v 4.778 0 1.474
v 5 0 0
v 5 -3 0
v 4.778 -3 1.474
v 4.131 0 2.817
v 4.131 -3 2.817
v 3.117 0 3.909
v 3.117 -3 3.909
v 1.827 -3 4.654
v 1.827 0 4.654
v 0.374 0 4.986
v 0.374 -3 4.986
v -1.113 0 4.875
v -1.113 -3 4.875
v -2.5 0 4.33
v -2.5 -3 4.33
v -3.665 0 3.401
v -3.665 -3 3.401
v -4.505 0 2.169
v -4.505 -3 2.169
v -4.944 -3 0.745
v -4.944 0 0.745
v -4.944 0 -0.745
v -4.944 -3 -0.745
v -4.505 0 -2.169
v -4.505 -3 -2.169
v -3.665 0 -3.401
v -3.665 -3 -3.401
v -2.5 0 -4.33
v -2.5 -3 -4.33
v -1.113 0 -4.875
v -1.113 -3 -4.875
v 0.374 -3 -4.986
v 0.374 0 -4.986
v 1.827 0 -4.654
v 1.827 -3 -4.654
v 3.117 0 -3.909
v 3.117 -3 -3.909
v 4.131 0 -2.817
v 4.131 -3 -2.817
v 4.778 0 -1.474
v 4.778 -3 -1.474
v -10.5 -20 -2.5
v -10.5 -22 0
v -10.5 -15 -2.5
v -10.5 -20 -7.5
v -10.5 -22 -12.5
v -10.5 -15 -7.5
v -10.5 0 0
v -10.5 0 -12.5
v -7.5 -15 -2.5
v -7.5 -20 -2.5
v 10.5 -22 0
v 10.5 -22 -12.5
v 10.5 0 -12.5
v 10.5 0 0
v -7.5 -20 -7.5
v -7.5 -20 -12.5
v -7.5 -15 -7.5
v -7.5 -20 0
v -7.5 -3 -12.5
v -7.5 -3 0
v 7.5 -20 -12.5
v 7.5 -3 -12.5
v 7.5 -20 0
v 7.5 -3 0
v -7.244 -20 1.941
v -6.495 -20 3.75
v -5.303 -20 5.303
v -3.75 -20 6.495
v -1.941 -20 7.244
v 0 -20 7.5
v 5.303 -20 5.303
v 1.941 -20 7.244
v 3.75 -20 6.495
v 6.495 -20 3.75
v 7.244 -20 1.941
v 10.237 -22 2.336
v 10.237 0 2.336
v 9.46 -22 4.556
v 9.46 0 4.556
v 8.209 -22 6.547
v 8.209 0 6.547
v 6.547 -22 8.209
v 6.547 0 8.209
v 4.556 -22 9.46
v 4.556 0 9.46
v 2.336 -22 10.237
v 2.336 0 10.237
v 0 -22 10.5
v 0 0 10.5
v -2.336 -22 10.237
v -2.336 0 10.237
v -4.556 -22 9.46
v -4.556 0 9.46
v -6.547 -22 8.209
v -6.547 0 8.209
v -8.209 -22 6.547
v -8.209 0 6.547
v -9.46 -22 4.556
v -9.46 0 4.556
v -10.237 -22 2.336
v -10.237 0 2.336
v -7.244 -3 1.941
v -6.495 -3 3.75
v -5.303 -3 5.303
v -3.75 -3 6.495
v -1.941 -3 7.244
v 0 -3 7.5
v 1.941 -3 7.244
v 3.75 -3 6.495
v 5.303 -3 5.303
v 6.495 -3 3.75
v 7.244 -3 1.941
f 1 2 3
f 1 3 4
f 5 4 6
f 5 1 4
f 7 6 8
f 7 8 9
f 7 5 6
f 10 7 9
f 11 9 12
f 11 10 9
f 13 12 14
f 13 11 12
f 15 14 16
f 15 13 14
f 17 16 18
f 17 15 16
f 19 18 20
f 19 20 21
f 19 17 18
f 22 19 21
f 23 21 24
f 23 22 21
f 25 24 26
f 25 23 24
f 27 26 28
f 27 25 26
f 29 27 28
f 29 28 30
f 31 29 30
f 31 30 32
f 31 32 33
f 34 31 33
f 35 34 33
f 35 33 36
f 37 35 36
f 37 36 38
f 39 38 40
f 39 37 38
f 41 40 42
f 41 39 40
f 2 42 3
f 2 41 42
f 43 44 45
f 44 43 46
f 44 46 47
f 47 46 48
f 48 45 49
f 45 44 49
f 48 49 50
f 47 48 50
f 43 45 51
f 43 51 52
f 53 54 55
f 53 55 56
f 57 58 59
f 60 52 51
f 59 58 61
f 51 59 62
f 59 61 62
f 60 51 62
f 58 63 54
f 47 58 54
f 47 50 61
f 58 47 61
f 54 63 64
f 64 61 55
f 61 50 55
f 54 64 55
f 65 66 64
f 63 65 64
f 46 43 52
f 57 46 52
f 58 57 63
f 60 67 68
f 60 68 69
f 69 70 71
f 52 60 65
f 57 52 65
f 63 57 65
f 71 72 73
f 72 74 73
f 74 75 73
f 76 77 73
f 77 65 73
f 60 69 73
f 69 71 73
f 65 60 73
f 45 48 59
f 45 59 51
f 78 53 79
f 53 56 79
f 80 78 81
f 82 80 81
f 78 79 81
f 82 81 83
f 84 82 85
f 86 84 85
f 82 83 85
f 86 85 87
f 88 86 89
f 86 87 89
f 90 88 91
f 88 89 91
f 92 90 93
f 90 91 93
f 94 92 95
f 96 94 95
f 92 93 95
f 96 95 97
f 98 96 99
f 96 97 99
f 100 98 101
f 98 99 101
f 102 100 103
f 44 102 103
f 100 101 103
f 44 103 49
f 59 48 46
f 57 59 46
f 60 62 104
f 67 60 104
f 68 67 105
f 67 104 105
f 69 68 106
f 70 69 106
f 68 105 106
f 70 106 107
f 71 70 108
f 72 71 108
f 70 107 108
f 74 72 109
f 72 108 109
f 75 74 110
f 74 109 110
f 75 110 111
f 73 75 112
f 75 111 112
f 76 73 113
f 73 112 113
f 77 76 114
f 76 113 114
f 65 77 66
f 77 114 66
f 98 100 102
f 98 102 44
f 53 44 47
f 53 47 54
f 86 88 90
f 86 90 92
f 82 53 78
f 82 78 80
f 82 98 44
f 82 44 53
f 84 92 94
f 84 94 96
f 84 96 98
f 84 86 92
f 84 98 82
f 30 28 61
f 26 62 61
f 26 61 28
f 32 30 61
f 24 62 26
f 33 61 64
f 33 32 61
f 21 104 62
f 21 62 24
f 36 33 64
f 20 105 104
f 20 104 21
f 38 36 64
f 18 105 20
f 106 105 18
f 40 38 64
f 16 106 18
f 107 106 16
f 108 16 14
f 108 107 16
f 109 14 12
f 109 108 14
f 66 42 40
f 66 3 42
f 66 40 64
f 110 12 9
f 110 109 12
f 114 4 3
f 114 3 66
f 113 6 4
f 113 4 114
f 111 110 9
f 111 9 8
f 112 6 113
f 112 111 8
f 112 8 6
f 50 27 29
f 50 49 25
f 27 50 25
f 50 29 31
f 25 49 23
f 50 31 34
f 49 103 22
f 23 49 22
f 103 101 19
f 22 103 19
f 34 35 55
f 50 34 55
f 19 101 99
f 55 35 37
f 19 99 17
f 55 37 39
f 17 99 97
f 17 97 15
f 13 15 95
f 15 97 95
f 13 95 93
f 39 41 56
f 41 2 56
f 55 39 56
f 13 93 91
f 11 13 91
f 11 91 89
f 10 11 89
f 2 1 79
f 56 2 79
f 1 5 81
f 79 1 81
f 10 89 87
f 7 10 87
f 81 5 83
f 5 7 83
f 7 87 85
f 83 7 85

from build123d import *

# Parameters (mm, degrees)
F0_R     = 5
F1_DEPTH = 3
F3_DEPTH = 20
F5_DEPTH = 2
F6_W     = 5
F6_H     = 5
F7_DEPTH = 5


with BuildPart() as f1:
    # F0 (on Front) → F1 (new body)
    with BuildSketch(Plane.XZ):
        with BuildLine():
            Line((7.5, -12.5), (7.5, 0))
            ThreePointArc((7.5, 0), (0, 7.5), (-7.5, 0))
            Line((-7.5, 0), (-7.5, -12.5))
            Line((-7.5, -12.5), (7.5, -12.5))
        make_face()
        Circle(F0_R, mode=Mode.SUBTRACT)
    extrude(amount=F1_DEPTH)

    # F2 (on Front) → F3 (join)
    with BuildSketch(Plane.XZ):
        with BuildLine():
            Line((10.5, -12.5), (10.5, 0))
            ThreePointArc((10.5, 0), (0, 10.5), (-10.5, 0))
            Line((-10.5, 0), (-10.5, -12.5))
            Line((-10.5, -12.5), (-7.5, -12.5))
            Line((-7.5, -12.5), (-7.5, 0))
            ThreePointArc((-7.5, 0), (0, 7.5), (7.5, 0))
            Line((7.5, 0), (7.5, -12.5))
            Line((7.5, -12.5), (10.5, -12.5))
        make_face()
    extrude(amount=F3_DEPTH)

    # F4 (on face) → F5 (join)
    with BuildSketch(Plane.XZ.offset(20)):
        with BuildLine():
            Line((10.5, -12.5), (10.5, 0))
            ThreePointArc((10.5, 0), (0, 10.5), (-10.5, 0))
            Line((-10.5, 0), (-10.5, -12.5))
            Line((-10.5, -12.5), (10.5, -12.5))
        make_face()
    extrude(amount=F5_DEPTH)

    # F6 (on face) → F7 (cut)
    with BuildSketch(Plane(origin=(-10.5, 0, 0), x_dir=(0, -1, 0), z_dir=(-1, 0, 0))):
        with Locations((17.5, -5)):
            Rectangle(F6_W, F6_H)
    extrude(amount=-F7_DEPTH, mode=Mode.SUBTRACT)


solid = f1.part
